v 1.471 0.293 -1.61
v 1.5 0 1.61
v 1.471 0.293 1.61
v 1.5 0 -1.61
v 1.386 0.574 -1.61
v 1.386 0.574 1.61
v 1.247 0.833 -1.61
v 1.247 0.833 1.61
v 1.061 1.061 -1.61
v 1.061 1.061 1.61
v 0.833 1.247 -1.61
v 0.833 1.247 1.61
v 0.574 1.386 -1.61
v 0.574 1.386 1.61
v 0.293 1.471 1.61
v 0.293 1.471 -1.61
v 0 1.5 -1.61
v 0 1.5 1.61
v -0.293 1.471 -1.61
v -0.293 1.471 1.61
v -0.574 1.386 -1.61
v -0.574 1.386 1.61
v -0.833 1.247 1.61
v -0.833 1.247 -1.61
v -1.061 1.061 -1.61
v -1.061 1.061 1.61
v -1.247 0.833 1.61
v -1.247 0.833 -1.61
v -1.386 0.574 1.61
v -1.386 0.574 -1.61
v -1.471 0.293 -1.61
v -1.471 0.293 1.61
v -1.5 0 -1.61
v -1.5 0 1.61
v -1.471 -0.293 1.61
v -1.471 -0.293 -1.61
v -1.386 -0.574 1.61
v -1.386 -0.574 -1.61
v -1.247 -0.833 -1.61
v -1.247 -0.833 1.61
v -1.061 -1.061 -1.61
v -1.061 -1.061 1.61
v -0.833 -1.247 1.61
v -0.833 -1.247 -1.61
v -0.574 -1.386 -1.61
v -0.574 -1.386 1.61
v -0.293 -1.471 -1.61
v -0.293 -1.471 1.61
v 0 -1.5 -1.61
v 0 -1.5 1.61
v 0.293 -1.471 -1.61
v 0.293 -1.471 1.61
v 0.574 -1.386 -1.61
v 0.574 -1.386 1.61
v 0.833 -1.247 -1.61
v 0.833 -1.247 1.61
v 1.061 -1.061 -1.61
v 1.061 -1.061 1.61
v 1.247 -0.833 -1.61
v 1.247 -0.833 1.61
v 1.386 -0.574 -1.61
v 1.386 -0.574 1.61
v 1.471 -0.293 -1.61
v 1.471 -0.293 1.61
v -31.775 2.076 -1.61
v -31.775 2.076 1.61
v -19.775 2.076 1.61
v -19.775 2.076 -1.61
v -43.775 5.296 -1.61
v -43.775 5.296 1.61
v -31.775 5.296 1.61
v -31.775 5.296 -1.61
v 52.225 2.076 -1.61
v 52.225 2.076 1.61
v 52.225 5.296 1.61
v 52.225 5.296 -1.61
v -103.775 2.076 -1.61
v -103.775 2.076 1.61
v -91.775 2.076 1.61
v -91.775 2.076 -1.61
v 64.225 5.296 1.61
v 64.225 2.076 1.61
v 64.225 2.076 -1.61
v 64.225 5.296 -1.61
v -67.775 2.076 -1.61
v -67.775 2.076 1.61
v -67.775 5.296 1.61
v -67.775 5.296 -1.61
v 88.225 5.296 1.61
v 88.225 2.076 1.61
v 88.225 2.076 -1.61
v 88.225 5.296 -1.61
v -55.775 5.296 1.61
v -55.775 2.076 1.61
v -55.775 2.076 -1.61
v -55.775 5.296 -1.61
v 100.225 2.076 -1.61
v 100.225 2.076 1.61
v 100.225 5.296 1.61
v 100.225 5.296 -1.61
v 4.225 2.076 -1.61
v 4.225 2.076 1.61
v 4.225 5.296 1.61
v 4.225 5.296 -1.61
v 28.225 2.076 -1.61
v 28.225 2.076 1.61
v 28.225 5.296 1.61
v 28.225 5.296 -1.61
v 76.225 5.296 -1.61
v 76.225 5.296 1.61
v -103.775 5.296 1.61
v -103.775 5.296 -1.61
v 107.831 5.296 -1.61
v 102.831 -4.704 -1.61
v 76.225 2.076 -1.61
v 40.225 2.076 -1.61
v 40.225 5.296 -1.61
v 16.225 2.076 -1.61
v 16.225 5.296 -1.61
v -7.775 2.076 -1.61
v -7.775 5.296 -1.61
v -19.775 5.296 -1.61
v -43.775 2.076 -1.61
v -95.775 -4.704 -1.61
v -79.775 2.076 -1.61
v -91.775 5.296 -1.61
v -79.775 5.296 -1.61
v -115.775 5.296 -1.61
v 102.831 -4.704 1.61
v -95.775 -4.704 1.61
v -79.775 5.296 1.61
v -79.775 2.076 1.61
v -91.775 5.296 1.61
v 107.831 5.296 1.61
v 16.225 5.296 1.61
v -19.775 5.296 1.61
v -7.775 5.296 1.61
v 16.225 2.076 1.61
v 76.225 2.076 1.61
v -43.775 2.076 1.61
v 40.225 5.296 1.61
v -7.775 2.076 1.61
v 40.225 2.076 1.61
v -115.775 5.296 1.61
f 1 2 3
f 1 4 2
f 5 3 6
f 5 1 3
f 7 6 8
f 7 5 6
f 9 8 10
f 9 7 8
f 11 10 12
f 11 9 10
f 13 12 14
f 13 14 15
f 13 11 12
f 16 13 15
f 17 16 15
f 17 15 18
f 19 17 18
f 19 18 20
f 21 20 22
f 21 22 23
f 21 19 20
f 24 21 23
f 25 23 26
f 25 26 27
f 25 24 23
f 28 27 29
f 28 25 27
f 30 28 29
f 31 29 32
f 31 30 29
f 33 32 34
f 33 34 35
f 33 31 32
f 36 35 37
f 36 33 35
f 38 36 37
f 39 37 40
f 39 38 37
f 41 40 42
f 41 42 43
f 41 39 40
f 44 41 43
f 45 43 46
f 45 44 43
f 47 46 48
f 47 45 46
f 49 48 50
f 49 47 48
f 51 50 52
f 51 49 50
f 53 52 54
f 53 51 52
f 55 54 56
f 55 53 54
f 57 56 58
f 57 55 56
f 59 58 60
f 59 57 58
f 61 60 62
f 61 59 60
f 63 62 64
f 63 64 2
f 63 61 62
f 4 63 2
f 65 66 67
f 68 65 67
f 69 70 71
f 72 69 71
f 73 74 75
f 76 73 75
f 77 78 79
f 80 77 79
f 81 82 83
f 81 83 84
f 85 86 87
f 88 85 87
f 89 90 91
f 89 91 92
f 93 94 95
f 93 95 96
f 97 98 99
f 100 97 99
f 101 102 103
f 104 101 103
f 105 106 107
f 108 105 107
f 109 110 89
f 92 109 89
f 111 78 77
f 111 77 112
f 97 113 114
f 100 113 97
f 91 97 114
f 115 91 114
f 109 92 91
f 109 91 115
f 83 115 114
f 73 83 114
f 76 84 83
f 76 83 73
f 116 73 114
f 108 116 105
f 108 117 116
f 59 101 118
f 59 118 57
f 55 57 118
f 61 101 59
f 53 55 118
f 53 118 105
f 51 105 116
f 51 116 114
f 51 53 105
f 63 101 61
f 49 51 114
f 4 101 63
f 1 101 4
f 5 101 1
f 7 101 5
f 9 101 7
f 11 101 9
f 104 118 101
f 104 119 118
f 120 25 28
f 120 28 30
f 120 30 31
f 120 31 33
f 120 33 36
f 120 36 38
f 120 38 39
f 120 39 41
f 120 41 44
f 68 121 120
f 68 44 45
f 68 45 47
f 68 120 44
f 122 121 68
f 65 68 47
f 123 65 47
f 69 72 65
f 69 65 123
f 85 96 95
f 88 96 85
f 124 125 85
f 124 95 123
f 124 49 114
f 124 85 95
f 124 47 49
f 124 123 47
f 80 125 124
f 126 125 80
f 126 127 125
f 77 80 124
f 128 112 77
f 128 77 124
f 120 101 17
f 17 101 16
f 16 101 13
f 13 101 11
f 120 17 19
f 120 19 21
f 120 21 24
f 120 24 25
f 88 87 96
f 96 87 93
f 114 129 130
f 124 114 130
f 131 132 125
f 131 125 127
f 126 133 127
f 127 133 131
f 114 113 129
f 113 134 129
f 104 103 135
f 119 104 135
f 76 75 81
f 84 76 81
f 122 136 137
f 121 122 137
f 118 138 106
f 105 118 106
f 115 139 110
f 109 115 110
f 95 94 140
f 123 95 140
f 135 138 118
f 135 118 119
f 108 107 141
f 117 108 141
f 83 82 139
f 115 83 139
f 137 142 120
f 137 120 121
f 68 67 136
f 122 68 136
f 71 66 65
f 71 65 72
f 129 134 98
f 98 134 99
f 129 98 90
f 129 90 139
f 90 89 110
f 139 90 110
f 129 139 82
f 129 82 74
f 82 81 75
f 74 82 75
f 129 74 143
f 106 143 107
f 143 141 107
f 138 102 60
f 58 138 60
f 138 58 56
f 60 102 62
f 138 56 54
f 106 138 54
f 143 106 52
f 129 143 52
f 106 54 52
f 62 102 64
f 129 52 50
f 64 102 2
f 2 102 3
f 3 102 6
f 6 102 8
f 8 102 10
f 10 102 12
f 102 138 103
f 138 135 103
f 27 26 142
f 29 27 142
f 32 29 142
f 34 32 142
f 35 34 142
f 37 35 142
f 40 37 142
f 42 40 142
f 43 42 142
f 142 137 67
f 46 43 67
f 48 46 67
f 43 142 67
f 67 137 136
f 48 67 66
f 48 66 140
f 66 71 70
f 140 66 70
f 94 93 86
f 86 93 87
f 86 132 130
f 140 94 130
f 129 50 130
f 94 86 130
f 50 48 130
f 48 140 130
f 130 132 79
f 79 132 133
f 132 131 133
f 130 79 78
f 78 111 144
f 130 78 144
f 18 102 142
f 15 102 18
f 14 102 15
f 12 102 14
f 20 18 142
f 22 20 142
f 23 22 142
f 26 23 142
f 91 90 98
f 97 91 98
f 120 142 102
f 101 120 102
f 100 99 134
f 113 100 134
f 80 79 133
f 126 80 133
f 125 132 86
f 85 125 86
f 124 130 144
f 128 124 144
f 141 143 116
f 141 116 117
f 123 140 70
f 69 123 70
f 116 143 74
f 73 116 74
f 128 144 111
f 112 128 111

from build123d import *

# Parameters (mm, degrees)
SKETCH1_R           = 1.5
BOSS_EXTRUDE1_DEPTH = 1.61
SKETCH2_W           = 12
SKETCH2_H           = 3.22
CUT_EXTRUDE1_DEPTH  = 3.22
LPATTERN1_COUNT     = 9
LPATTERN1_PITCH     = 24


with BuildPart() as part:
    # Sketch1 → Boss-Extrude1 (new body, symmetric)
    with BuildSketch(Plane.XY):
        Polygon((-95.775442885, -4.703941319), (-115.775442885, 5.296058681), (107.831354865, 5.296058681), (102.831354865, -4.703941319), align=None)
        Circle(SKETCH1_R, mode=Mode.SUBTRACT)
    extrude(amount=BOSS_EXTRUDE1_DEPTH, both=True)

    # Sketch2 → Cut-Extrude1 (cut)
    with BuildSketch(Plane.XY.offset(1.61)):
        with Locations((-97.775442885, 3.686058681)):
            Rectangle(SKETCH2_W, SKETCH2_H)
    cut_extrude1 = extrude(amount=-CUT_EXTRUDE1_DEPTH, mode=Mode.SUBTRACT)

    # LPattern1: Cut-Extrude1 ×9
    with Locations(*[(i * LPATTERN1_PITCH, 0, 0) for i in range(1, LPATTERN1_COUNT)]):
        add(cut_extrude1, mode=Mode.SUBTRACT)


solid = part.part
